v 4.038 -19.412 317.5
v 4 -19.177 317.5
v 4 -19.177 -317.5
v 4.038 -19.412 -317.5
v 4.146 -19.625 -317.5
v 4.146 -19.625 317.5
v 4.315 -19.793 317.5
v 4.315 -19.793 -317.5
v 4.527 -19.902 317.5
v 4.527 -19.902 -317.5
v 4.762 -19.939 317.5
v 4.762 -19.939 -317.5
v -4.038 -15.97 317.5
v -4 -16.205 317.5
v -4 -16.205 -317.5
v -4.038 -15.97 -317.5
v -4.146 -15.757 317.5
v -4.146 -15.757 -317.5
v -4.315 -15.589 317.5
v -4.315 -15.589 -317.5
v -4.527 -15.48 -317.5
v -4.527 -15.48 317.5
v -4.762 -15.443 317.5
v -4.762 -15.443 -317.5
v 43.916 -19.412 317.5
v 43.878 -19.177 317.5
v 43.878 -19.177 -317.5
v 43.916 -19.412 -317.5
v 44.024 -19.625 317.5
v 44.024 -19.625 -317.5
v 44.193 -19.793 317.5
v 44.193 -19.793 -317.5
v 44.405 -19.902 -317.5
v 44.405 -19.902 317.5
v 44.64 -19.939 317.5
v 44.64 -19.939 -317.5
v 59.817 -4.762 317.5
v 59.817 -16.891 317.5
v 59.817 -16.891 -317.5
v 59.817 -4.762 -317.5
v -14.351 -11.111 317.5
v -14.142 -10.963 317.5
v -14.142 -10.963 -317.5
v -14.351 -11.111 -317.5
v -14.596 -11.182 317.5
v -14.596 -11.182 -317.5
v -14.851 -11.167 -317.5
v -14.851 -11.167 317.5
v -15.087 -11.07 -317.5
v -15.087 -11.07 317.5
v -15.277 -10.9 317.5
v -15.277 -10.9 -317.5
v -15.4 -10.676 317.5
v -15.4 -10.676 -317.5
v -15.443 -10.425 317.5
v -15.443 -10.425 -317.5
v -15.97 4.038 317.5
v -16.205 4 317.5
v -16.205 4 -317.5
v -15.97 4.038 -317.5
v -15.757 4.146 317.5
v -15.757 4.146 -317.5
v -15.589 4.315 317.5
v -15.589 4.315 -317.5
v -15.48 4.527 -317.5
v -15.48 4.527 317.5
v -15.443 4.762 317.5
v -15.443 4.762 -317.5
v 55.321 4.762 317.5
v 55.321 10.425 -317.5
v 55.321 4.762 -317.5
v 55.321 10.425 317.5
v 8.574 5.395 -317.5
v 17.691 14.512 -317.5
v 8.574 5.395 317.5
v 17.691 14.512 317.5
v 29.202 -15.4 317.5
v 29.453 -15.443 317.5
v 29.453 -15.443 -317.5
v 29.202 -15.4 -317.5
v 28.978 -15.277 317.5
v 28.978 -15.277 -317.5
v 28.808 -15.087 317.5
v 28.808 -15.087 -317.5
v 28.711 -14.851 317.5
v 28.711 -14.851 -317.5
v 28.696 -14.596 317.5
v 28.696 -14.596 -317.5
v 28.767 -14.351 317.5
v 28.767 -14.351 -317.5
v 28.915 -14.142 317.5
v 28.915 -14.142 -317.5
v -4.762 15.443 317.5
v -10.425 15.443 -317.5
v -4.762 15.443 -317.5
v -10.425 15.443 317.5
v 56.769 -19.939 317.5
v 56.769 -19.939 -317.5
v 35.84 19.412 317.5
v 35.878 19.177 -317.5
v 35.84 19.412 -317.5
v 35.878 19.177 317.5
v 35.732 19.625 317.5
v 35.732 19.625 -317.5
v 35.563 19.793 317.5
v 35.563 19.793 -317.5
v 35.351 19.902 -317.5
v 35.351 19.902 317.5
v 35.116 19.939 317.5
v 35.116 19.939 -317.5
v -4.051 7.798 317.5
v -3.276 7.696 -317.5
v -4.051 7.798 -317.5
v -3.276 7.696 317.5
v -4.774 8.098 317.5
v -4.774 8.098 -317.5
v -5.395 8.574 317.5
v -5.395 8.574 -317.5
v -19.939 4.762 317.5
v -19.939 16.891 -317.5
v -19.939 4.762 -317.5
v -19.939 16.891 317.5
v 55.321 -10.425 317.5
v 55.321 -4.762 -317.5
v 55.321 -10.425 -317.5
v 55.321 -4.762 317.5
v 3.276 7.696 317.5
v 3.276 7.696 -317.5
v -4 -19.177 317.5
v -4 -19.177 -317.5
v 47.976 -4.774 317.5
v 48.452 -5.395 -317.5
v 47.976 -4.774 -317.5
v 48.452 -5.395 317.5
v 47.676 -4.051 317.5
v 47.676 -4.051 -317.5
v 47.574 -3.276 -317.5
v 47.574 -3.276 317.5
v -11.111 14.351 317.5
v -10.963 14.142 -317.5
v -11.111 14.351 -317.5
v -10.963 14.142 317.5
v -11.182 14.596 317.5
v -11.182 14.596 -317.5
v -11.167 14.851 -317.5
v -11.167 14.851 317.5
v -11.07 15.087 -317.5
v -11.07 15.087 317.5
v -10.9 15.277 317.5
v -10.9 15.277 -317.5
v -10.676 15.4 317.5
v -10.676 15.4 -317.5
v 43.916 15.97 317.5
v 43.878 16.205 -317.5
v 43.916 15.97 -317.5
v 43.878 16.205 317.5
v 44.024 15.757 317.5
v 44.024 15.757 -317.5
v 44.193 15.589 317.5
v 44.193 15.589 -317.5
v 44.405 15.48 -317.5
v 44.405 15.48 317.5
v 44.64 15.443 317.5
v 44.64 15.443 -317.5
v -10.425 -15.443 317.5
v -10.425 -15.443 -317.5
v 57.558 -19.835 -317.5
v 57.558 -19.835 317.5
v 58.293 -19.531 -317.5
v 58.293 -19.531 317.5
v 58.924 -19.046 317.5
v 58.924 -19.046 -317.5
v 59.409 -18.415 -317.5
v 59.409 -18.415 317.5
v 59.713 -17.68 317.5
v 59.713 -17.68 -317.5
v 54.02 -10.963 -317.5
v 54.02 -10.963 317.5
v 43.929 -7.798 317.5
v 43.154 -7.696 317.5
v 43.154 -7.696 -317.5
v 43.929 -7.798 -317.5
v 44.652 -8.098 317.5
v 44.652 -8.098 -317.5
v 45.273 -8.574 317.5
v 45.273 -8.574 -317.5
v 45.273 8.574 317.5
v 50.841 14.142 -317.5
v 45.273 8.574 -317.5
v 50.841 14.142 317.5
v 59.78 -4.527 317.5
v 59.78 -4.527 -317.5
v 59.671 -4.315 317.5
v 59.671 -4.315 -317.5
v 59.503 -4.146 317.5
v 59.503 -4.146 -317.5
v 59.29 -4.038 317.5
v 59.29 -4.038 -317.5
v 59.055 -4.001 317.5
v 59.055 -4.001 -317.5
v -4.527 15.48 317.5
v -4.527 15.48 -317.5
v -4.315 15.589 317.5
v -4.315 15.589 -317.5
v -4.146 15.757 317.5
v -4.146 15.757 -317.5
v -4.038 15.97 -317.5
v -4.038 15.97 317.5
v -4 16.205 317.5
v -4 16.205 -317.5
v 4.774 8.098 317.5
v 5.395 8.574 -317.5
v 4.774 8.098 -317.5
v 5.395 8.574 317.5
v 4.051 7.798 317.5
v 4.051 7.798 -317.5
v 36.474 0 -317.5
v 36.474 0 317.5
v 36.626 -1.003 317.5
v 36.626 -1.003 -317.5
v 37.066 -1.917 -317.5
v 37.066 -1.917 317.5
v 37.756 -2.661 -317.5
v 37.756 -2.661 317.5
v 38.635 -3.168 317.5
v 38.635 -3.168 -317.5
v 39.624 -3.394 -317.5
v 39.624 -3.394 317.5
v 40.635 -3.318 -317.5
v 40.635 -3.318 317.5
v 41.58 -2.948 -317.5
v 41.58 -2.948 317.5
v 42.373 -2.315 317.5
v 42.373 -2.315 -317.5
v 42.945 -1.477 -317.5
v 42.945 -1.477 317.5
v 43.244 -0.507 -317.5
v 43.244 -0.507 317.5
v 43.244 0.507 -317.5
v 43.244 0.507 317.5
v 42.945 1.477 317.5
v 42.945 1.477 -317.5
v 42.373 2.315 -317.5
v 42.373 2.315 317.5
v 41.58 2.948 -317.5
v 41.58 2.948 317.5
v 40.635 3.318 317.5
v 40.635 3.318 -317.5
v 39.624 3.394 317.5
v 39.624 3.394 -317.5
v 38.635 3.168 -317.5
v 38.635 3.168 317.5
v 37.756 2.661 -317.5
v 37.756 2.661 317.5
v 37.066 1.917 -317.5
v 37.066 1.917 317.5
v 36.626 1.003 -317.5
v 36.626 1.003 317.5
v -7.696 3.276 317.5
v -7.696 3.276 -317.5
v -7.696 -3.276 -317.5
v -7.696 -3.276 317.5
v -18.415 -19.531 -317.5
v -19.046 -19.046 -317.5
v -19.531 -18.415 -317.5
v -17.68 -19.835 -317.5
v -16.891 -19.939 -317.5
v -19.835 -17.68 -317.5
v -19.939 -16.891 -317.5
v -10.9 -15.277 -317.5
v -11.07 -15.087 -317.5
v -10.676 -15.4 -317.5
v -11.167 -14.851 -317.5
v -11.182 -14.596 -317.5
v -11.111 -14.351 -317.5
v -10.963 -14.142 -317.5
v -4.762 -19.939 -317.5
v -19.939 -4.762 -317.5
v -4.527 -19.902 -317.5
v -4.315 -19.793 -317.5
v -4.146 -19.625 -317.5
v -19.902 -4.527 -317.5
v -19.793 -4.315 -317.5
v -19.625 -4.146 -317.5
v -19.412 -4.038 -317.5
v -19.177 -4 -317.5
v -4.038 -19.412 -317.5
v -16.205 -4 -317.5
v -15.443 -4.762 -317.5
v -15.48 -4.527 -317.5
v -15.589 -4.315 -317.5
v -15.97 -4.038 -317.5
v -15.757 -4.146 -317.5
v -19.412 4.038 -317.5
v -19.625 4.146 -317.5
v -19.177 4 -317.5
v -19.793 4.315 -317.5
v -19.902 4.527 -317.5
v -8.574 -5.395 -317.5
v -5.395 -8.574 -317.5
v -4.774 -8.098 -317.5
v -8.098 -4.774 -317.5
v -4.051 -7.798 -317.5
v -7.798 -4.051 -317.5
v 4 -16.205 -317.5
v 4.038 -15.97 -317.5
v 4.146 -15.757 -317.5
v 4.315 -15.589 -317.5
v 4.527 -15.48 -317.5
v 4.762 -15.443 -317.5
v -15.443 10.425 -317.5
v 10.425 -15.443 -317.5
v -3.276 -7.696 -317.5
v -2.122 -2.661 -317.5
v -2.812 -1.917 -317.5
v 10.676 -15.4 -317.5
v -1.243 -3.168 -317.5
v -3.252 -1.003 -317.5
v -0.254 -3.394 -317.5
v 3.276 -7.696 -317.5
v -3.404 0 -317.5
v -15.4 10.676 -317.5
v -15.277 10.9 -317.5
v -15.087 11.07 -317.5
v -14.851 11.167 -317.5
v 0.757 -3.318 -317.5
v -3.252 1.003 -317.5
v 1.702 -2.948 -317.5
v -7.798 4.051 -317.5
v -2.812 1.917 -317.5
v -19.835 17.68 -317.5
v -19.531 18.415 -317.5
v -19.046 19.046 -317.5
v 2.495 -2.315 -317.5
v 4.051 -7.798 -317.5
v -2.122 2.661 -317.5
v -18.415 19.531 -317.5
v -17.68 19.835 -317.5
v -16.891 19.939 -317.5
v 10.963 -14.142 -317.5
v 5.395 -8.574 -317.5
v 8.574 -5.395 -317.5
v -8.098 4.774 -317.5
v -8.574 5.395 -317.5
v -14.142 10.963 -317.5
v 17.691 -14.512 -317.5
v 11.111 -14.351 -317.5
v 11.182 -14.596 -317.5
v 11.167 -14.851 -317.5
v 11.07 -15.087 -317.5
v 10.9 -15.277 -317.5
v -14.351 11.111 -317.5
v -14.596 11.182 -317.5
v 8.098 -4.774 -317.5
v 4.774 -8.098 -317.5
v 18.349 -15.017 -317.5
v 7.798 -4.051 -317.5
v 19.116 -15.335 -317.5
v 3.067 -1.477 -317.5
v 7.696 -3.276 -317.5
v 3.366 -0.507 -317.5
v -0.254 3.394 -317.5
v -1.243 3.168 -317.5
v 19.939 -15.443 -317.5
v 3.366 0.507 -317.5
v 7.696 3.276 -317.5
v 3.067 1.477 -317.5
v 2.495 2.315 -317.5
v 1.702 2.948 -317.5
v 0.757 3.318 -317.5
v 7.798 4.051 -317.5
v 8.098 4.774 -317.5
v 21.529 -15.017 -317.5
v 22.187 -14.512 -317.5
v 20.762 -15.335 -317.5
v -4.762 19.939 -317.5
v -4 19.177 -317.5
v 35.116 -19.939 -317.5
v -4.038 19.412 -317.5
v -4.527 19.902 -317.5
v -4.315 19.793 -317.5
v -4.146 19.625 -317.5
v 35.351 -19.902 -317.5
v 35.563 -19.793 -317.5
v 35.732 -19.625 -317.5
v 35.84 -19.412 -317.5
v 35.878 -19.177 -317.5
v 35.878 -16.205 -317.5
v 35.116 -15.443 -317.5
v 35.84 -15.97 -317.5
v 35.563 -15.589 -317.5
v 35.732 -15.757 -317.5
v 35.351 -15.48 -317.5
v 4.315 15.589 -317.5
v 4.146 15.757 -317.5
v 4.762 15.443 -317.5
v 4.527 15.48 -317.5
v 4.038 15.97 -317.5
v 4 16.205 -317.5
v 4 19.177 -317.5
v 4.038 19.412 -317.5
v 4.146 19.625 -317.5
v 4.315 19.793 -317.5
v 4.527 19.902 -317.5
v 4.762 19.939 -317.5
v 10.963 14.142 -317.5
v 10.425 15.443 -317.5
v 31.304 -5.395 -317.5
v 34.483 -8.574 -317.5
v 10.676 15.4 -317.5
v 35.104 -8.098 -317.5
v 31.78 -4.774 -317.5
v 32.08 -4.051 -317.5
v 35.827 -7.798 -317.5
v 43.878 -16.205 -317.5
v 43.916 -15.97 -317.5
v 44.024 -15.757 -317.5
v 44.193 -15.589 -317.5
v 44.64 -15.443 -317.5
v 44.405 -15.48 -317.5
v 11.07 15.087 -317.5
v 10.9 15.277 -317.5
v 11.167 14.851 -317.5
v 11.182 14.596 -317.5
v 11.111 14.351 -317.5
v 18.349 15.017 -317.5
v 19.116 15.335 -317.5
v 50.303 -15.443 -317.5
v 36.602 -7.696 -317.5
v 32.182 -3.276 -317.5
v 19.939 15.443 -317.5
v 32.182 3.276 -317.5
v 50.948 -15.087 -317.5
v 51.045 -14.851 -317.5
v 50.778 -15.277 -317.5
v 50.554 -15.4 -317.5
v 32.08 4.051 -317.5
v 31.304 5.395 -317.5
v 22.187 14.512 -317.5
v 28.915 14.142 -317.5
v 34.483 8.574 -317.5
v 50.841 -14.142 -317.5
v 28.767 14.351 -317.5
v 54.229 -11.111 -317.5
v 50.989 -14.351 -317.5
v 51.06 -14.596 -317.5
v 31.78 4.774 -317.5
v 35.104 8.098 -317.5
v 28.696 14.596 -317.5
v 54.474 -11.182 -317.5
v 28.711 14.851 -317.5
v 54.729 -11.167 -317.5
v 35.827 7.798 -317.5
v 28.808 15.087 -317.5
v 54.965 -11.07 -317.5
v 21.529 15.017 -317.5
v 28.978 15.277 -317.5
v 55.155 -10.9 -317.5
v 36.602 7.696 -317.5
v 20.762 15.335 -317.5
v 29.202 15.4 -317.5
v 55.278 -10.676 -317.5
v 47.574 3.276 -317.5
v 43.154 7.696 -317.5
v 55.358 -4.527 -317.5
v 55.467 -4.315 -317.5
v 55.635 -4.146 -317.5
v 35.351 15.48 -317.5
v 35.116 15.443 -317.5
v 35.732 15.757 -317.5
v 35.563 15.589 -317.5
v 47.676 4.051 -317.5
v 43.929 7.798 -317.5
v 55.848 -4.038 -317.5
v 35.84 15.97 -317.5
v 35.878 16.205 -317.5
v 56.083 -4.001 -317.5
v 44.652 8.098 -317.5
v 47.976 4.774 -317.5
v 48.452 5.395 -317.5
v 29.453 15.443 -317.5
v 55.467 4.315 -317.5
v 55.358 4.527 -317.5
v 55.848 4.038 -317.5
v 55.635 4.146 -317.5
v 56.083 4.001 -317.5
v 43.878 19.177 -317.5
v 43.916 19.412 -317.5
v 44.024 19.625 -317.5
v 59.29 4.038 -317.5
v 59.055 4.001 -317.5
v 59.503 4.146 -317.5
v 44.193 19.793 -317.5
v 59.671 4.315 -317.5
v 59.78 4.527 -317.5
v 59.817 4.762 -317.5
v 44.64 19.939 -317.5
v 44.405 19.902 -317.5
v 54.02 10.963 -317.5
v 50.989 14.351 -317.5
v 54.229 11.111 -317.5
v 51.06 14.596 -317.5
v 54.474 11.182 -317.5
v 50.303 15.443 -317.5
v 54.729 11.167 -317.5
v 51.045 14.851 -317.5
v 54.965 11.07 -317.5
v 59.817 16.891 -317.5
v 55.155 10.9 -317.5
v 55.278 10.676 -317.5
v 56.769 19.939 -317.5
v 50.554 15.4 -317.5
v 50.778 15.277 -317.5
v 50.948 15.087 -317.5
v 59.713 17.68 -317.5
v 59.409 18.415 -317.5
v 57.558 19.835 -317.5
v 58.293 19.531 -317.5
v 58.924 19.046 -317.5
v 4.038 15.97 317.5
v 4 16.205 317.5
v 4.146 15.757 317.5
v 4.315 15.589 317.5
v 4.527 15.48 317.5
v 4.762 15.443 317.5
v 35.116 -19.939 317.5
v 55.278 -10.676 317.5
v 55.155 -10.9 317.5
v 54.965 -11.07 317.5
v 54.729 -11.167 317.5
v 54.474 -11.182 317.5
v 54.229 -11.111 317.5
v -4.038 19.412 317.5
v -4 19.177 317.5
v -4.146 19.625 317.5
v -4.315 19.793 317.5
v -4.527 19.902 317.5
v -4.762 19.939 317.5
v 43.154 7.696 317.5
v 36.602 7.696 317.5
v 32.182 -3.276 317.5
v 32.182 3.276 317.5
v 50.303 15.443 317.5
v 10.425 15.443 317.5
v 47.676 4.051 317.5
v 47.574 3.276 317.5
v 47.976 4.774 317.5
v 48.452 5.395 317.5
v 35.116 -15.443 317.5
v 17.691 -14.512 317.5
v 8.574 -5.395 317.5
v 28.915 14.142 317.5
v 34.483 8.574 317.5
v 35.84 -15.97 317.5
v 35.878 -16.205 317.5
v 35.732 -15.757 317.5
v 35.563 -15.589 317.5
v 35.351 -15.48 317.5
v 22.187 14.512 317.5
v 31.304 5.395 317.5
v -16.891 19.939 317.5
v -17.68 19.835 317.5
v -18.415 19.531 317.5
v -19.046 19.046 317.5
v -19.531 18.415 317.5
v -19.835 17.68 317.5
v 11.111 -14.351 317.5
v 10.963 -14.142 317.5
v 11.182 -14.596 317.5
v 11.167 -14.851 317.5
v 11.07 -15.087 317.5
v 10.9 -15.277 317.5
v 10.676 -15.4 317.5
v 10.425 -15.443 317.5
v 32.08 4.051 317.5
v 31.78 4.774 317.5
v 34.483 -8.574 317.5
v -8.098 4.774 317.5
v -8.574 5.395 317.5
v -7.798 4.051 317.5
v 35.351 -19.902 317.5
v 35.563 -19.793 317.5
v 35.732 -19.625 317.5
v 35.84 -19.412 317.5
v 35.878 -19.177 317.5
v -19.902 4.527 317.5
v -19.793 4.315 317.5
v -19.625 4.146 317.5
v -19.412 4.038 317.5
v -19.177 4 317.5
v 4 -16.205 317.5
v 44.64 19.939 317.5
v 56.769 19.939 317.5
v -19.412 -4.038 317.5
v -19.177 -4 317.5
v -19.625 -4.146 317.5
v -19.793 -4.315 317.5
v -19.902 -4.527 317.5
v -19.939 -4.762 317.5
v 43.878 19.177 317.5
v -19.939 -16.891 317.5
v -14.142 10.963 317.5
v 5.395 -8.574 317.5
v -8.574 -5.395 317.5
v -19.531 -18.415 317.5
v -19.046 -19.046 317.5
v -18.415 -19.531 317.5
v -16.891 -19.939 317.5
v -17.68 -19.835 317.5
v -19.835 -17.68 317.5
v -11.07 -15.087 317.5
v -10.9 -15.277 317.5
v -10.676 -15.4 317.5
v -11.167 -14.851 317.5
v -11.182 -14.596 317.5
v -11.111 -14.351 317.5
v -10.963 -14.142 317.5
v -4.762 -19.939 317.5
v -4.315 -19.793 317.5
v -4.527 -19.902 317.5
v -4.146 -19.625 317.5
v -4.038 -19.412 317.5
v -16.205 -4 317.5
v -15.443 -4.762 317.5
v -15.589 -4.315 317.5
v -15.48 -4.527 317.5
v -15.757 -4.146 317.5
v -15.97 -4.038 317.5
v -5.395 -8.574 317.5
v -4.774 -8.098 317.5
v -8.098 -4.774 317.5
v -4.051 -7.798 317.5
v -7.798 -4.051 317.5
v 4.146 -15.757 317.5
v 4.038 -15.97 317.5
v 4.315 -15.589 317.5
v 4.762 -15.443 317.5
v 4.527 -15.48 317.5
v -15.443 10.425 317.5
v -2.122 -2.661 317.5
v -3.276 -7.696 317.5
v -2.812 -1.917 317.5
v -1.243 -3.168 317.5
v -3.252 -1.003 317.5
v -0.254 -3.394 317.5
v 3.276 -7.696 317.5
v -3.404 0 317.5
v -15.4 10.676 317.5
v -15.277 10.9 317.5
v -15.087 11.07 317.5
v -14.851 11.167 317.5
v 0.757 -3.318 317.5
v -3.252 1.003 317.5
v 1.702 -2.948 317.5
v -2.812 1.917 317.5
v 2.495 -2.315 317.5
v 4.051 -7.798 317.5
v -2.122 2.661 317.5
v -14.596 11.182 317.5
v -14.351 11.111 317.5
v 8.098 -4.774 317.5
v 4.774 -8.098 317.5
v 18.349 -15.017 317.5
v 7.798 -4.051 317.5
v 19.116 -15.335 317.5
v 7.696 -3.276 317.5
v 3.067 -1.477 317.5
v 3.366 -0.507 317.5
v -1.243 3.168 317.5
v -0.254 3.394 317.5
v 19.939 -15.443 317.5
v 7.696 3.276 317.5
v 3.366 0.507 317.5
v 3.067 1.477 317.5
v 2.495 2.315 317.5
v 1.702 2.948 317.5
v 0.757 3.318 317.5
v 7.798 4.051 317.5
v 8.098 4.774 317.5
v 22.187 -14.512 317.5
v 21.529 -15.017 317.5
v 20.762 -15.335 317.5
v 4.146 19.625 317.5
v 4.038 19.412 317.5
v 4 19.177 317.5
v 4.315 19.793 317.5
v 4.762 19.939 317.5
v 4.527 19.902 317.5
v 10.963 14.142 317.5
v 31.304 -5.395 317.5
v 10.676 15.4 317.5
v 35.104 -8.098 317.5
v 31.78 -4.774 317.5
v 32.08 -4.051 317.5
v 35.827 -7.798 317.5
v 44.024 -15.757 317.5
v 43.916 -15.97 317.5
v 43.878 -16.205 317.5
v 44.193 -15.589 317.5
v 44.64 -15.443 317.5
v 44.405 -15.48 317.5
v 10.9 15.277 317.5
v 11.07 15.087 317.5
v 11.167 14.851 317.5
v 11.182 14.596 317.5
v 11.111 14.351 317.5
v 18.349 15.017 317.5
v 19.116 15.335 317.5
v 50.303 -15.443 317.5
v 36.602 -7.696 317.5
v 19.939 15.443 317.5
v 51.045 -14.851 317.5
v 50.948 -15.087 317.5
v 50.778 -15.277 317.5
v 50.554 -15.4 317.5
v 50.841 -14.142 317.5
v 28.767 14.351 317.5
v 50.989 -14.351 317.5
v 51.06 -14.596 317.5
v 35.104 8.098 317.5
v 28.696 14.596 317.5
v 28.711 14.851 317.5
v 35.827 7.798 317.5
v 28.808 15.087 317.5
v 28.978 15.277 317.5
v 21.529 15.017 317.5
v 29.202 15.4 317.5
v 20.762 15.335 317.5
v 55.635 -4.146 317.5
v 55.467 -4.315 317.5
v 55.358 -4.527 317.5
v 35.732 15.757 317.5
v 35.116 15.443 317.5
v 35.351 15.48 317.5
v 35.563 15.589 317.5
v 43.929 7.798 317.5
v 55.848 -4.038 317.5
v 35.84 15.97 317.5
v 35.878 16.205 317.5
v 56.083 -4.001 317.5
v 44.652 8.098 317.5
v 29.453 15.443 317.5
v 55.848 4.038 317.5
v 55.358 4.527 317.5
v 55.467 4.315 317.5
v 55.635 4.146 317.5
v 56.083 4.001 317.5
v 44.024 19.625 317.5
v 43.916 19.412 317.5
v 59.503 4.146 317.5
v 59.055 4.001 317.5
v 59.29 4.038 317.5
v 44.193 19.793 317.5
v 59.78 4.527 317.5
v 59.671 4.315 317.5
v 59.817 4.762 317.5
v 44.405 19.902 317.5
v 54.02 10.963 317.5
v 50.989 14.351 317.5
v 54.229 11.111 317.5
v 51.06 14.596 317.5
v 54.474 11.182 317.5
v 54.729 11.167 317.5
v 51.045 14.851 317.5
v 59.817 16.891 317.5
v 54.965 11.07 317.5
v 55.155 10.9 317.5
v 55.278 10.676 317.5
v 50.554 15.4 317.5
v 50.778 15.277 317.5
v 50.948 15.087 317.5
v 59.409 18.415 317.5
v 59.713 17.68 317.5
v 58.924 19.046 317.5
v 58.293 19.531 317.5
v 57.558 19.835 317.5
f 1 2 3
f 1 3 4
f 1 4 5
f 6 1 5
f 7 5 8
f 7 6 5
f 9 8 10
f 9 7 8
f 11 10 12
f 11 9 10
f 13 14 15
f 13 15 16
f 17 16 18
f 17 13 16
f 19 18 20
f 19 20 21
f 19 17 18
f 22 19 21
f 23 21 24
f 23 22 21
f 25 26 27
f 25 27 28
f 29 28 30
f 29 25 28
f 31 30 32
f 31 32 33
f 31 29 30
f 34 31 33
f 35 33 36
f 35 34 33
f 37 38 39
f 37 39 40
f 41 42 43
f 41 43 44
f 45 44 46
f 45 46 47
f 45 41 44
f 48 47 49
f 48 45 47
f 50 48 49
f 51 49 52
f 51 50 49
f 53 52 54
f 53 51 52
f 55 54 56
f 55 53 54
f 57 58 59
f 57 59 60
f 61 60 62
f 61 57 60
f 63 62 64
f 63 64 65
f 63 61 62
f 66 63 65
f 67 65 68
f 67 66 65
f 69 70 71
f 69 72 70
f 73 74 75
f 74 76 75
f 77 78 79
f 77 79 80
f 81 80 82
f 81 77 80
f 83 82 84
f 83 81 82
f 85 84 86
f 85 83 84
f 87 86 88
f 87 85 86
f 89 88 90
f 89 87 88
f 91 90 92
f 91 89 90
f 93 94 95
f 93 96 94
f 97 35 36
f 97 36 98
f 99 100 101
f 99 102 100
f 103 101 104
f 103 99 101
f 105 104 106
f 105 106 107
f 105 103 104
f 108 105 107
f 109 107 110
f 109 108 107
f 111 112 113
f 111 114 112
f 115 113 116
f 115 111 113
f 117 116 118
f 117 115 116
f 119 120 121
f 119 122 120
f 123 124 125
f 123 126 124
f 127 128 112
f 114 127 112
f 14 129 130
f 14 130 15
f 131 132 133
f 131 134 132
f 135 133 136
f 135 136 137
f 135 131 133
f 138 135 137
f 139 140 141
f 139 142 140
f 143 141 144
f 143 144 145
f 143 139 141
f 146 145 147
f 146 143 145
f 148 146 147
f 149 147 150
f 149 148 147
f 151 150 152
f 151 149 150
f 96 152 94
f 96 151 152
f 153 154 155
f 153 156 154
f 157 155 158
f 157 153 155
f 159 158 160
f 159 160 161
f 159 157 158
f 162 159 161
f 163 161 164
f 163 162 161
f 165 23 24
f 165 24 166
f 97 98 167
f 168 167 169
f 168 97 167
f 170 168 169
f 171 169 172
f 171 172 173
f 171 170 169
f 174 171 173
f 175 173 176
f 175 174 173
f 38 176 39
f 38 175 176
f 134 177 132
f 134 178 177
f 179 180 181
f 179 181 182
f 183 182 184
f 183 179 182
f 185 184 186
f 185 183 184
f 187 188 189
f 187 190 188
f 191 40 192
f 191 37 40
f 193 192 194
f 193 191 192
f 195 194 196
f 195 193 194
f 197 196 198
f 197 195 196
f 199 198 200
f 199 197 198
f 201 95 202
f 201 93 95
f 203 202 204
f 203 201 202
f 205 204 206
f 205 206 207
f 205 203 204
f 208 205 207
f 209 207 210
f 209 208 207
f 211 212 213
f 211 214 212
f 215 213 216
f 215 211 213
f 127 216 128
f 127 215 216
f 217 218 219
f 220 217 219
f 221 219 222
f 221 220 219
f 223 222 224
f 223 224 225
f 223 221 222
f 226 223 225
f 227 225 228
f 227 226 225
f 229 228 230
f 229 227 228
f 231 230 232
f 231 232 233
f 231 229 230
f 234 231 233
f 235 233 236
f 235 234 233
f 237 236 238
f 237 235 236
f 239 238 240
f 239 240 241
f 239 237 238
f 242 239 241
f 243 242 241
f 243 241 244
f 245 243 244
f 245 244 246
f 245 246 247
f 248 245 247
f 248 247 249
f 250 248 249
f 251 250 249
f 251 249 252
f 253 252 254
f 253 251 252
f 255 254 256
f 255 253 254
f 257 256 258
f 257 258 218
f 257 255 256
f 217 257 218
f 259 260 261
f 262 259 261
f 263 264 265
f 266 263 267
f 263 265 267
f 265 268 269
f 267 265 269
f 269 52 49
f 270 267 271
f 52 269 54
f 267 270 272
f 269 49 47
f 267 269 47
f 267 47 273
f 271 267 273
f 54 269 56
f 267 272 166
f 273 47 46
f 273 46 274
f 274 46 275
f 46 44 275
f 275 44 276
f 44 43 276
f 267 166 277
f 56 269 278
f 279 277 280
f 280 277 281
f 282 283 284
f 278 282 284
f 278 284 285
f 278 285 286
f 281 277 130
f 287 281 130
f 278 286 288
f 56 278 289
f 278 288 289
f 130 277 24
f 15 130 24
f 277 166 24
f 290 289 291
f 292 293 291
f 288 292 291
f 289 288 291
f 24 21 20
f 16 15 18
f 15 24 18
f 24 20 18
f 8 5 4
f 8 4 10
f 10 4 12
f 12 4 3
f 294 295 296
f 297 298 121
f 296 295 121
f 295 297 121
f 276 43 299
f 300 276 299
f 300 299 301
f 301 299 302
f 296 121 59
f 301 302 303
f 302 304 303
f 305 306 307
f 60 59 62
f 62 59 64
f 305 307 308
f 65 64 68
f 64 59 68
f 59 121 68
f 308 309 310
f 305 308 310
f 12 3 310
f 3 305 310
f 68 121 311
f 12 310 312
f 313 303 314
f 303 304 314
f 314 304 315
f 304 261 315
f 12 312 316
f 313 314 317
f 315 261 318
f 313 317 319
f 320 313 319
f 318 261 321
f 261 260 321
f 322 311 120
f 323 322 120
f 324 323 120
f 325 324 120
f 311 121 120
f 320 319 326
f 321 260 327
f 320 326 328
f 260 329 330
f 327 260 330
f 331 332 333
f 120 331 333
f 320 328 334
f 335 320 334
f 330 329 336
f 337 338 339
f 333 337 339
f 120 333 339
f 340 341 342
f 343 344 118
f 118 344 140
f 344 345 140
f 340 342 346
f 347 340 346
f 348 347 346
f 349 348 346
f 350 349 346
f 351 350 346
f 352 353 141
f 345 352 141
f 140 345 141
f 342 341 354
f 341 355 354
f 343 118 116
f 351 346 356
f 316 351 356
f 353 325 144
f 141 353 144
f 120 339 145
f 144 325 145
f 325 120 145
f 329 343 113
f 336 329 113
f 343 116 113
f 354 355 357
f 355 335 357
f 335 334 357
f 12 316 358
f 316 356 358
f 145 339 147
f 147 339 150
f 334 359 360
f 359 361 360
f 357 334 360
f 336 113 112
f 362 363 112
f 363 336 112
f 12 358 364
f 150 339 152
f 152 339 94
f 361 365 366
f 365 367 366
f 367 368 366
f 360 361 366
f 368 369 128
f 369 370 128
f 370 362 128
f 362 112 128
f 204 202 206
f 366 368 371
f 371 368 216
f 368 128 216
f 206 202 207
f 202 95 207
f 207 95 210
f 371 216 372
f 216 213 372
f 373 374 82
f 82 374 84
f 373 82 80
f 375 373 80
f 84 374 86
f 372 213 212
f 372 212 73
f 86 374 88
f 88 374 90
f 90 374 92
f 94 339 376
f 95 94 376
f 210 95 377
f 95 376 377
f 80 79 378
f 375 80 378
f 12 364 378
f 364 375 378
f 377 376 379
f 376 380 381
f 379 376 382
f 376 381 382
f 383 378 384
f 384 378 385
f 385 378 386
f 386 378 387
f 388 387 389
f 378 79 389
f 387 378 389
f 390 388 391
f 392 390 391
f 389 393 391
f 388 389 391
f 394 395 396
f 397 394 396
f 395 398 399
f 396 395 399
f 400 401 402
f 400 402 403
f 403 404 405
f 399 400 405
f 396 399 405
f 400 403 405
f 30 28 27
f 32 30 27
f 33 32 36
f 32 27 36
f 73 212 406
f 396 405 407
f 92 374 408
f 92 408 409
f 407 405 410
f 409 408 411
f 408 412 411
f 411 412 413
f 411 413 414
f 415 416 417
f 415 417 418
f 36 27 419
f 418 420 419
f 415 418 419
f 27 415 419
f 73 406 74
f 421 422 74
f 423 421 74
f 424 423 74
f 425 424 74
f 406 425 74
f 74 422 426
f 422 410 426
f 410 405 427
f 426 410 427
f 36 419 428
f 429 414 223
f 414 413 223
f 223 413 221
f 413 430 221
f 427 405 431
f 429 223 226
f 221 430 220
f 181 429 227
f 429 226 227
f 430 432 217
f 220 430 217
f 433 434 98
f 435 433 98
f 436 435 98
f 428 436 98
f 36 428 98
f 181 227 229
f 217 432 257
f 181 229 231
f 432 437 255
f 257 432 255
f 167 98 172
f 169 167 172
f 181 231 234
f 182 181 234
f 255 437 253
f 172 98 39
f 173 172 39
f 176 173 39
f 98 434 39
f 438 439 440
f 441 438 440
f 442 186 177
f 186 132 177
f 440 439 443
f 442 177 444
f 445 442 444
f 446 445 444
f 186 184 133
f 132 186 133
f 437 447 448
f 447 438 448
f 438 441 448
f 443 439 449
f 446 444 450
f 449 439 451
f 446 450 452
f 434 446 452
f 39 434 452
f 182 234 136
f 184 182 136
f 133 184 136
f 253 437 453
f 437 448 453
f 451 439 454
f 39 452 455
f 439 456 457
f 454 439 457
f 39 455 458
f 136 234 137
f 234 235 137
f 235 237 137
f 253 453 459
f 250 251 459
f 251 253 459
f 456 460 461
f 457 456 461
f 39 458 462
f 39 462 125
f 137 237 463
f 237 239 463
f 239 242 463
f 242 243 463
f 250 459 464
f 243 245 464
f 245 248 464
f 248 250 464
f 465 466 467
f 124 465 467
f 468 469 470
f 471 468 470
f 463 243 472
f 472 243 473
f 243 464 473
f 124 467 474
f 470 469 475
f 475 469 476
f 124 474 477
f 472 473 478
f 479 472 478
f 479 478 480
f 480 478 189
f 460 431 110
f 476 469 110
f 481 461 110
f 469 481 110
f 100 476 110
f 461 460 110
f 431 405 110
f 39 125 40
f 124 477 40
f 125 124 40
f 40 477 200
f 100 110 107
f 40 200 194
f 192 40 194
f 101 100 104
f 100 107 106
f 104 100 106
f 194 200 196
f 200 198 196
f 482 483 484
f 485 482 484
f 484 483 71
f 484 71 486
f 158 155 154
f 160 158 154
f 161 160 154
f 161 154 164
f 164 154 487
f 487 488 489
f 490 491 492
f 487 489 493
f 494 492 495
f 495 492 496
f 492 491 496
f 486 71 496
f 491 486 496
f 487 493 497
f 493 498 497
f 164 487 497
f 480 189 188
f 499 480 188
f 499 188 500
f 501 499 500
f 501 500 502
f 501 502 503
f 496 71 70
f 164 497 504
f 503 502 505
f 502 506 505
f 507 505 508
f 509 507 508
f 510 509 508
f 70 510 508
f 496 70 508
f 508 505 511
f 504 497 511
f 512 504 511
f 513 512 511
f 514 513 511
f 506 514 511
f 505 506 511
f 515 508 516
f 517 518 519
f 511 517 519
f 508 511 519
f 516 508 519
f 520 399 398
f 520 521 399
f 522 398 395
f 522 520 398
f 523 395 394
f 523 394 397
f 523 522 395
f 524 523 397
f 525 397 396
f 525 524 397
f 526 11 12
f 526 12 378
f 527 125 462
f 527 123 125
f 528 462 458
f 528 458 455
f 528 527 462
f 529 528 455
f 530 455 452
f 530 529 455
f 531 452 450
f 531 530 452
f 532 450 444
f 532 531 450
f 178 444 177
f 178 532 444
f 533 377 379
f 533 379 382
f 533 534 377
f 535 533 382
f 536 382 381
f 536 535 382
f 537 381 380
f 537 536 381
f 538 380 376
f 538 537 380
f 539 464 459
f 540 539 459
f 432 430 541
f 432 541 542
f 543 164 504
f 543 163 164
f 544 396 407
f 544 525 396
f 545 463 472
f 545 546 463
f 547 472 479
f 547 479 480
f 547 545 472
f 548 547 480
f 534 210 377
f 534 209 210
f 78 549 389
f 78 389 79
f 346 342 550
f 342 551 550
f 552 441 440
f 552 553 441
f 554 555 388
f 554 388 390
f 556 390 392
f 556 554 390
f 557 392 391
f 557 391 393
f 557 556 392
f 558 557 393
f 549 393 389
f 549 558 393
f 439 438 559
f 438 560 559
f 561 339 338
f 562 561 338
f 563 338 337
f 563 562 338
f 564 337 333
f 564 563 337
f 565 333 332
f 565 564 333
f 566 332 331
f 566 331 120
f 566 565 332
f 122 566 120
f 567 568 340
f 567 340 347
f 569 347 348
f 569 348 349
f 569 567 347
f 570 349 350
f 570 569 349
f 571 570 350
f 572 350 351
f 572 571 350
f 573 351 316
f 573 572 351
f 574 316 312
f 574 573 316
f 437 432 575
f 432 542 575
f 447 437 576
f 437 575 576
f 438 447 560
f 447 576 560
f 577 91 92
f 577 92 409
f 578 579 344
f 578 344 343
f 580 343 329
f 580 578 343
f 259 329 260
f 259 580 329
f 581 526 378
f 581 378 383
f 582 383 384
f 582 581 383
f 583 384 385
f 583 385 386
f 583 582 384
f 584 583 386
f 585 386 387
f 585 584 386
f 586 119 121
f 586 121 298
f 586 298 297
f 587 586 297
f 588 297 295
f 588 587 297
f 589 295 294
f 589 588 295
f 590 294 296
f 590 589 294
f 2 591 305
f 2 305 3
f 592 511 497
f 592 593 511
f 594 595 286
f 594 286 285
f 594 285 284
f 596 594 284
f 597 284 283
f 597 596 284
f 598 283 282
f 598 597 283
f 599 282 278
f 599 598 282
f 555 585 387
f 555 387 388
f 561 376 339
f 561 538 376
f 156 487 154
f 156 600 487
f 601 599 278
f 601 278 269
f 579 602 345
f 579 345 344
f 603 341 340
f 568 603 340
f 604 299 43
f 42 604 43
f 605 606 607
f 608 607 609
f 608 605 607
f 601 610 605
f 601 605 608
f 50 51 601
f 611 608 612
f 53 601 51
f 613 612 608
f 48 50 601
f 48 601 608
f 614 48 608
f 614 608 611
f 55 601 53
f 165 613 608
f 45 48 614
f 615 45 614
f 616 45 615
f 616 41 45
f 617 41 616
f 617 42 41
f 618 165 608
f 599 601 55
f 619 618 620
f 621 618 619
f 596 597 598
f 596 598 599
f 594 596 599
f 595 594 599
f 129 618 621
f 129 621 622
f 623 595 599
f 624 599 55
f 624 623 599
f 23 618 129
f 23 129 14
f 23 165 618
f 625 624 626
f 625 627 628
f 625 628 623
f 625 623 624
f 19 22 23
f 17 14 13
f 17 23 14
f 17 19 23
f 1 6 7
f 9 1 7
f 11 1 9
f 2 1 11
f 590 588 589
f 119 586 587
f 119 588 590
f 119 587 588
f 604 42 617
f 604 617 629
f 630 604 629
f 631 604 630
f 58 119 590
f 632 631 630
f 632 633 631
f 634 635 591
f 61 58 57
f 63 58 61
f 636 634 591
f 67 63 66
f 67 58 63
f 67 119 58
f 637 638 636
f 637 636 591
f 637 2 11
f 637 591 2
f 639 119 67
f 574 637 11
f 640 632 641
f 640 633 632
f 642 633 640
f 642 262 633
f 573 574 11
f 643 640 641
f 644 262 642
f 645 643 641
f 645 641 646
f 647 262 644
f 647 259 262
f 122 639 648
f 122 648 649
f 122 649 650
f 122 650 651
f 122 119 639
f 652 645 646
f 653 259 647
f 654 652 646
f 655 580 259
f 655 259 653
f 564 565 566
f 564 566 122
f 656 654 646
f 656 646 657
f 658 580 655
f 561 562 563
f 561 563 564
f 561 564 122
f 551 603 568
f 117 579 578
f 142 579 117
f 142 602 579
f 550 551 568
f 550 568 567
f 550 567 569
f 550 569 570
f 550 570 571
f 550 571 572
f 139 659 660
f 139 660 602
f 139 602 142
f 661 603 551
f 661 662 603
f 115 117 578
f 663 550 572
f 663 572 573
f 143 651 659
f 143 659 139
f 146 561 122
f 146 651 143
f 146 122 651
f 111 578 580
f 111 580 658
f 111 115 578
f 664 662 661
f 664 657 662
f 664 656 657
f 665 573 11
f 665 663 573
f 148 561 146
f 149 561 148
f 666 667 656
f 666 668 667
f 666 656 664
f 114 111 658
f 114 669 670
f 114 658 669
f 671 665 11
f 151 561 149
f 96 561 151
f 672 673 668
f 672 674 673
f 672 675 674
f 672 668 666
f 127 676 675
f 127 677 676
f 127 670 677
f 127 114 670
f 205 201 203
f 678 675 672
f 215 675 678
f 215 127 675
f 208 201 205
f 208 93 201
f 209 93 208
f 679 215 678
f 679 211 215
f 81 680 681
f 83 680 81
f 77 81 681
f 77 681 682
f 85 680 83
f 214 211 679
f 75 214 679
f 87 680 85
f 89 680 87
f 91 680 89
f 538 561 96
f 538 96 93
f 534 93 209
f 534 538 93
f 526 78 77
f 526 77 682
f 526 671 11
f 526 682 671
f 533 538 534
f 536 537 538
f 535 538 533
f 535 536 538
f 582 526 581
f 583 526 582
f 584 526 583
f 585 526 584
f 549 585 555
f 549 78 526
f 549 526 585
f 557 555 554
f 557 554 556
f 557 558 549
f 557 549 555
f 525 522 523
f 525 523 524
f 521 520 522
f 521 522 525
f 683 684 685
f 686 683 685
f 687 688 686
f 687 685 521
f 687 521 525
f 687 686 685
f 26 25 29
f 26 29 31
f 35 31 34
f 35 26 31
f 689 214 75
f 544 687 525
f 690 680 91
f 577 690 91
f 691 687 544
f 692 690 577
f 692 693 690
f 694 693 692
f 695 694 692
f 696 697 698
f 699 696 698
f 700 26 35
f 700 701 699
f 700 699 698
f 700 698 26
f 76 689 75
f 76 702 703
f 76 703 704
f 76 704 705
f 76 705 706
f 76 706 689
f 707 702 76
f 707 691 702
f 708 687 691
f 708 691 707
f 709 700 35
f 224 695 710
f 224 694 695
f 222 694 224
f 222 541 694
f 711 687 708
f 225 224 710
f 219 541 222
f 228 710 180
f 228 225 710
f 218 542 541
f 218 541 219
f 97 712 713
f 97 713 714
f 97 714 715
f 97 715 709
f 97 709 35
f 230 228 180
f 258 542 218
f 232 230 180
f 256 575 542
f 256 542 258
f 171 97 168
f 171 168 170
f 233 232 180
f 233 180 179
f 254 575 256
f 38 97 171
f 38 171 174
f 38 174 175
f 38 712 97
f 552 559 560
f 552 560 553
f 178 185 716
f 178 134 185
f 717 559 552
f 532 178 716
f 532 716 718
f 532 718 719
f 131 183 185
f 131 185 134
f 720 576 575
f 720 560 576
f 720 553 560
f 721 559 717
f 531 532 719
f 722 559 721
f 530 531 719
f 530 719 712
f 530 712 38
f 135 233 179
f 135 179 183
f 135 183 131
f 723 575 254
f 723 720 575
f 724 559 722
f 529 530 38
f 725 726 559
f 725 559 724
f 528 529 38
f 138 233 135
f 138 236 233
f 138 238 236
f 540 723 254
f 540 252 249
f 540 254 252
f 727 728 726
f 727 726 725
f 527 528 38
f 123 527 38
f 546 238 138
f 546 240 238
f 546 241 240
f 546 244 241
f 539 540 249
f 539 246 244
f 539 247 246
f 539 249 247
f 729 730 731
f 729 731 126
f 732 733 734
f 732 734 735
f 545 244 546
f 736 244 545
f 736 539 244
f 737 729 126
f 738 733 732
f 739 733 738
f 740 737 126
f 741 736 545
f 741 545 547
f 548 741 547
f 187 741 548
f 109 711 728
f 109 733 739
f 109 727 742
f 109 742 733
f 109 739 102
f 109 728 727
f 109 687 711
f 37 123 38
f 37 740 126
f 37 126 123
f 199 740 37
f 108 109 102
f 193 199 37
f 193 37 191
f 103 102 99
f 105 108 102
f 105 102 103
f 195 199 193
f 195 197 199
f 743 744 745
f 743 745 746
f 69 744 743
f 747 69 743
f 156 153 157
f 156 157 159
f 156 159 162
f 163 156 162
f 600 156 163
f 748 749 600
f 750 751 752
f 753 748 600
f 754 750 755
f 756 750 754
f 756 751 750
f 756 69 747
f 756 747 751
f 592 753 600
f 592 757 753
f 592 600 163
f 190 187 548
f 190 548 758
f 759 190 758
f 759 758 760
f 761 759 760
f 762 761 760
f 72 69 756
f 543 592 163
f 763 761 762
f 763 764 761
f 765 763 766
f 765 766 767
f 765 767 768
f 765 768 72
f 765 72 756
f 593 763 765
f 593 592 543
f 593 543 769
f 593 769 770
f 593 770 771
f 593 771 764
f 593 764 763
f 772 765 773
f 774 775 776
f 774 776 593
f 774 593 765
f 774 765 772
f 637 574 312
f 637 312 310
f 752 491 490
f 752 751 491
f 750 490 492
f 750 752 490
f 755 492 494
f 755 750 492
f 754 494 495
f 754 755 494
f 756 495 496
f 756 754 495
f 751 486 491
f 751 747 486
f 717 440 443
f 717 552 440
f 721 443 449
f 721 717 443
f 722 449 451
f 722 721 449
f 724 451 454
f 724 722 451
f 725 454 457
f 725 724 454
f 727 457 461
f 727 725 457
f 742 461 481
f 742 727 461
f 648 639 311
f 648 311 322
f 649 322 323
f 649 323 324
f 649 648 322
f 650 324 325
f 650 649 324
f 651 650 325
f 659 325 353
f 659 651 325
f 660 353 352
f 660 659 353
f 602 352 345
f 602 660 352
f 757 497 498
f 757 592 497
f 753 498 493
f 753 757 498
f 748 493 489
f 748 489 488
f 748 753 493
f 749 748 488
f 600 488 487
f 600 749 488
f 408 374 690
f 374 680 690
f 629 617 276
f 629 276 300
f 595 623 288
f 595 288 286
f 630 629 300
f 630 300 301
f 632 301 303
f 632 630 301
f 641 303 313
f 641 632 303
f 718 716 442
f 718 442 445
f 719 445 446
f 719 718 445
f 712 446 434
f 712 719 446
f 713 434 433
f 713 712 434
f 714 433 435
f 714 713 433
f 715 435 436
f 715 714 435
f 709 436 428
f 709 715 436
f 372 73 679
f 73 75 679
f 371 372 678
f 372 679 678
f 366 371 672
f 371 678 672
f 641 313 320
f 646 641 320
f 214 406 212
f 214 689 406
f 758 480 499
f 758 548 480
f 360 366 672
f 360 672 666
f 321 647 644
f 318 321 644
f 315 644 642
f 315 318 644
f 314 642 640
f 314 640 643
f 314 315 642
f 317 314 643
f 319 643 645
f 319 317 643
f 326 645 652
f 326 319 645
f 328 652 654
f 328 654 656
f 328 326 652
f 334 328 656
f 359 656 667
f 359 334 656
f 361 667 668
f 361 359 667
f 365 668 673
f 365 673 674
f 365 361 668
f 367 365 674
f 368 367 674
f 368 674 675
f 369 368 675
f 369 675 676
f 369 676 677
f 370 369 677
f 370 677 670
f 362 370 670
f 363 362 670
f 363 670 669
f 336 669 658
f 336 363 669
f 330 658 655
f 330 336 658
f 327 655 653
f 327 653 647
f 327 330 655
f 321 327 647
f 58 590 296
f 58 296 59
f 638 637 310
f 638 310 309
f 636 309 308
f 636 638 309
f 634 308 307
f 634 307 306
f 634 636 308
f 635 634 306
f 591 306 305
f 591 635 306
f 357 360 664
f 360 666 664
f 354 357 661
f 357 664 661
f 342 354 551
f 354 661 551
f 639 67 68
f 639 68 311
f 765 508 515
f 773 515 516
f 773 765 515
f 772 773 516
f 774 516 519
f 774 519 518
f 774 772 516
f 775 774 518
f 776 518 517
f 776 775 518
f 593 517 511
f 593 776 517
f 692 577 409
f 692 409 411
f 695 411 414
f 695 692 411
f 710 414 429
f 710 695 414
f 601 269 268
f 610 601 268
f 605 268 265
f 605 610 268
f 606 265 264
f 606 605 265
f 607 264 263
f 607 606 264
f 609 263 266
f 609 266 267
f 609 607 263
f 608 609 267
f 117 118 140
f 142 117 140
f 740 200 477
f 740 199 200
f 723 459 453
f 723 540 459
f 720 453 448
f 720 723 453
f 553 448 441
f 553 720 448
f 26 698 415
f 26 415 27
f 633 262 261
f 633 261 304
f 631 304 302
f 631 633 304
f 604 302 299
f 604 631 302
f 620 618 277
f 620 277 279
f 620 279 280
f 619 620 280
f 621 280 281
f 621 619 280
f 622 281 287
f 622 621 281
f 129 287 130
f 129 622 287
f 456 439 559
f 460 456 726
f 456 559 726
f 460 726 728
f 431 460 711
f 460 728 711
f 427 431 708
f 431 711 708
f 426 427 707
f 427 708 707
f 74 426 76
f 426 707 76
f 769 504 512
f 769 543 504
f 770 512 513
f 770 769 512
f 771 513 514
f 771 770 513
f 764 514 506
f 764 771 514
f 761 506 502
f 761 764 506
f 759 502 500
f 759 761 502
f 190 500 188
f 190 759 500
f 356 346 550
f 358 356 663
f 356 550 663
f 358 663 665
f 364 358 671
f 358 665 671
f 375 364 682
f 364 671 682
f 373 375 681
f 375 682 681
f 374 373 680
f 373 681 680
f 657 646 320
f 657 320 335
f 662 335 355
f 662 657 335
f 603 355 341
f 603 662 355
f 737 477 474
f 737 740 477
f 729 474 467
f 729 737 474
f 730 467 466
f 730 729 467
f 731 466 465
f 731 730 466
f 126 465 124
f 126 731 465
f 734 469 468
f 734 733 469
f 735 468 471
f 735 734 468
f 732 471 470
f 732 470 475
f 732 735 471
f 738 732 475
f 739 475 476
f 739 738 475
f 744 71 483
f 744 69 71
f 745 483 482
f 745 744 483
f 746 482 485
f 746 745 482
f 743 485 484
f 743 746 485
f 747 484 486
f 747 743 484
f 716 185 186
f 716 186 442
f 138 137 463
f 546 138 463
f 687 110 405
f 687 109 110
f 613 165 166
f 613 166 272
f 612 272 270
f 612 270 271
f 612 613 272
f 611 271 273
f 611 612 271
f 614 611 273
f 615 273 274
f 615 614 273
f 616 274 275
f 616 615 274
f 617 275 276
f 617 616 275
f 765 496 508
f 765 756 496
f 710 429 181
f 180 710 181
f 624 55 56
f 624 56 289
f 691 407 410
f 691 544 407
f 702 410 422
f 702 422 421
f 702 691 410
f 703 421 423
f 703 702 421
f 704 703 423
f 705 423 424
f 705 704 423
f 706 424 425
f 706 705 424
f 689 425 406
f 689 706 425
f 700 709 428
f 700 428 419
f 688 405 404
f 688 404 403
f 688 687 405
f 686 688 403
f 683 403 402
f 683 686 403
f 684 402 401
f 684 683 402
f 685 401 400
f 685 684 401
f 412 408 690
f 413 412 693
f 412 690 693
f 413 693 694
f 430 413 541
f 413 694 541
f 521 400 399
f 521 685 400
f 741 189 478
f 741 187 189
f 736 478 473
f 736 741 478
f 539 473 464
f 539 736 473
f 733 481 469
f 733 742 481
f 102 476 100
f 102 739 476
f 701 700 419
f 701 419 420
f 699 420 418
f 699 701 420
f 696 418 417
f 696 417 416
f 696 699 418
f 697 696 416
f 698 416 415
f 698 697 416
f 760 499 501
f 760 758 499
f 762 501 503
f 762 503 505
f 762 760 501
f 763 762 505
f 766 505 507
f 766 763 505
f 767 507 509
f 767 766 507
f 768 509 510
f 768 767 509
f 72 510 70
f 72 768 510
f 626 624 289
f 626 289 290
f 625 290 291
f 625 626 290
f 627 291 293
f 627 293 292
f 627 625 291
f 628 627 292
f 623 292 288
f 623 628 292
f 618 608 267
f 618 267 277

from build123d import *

# Parameters (mm, degrees)
SKETCH1_R      = 3.4036
EXTRUDE1_DEPTH = 317.5


with BuildPart() as part:
    # Sketch1 → Extrude1 (new, symmetric)
    with BuildSketch(Plane.XY):
        with BuildLine():
            Line((-19.939, 16.891), (-19.939, 4.7625))
            ThreePointArc((-19.939, 4.7625), (-19.715815367, 4.223684633), (-19.177, 4.0005))
            Line((-19.177, 4.0005), (-16.2052, 4.0005))
            ThreePointArc((-16.2052, 4.0005), (-15.666384633, 4.223684633), (-15.4432, 4.7625))
            Line((-15.4432, 4.7625), (-15.4432, 10.424558599))
            ThreePointArc((-15.4432, 10.424558599), (-14.972804775, 11.128554802), (-14.142384633, 10.963373966))
            Line((-14.142384633, 10.963373966), (-8.574059555, 5.395048889))
            ThreePointArc((-8.574059555, 5.395048889), (-7.924348265, 4.422687227), (-7.6962, 3.275708444))
            Line((-7.6962, 3.275708444), (-7.6962, -3.275708444))
            ThreePointArc((-7.6962, -3.275708444), (-7.924348265, -4.422687227), (-8.574059555, -5.395048889))
            Line((-8.574059555, -5.395048889), (-14.142384633, -10.963373966))
            ThreePointArc((-14.142384633, -10.963373966), (-14.972804775, -11.128554802), (-15.4432, -10.424558599))
            Line((-15.4432, -10.424558599), (-15.4432, -4.7625))
            ThreePointArc((-15.4432, -4.7625), (-15.666384633, -4.223684633), (-16.2052, -4.0005))
            Line((-16.2052, -4.0005), (-19.177, -4.0005))
            ThreePointArc((-19.177, -4.0005), (-19.715815367, -4.223684633), (-19.939, -4.7625))
            Line((-19.939, -4.7625), (-19.939, -16.891))
            ThreePointArc((-19.939, -16.891), (-19.046261469, -19.046261469), (-16.891, -19.939))
            Line((-16.891, -19.939), (-4.7625, -19.939))
            ThreePointArc((-4.7625, -19.939), (-4.223684633, -19.715815367), (-4.0005, -19.177))
            Line((-4.0005, -19.177), (-4.0005, -16.2052))
            ThreePointArc((-4.0005, -16.2052), (-4.223684633, -15.666384633), (-4.7625, -15.4432))
            Line((-4.7625, -15.4432), (-10.424558599, -15.4432))
            ThreePointArc((-10.424558599, -15.4432), (-11.128554802, -14.972804775), (-10.963373966, -14.142384633))
            Line((-10.963373966, -14.142384633), (-5.395048889, -8.574059555))
            ThreePointArc((-5.395048889, -8.574059555), (-4.422687227, -7.924348265), (-3.275708444, -7.6962))
            Line((-3.275708444, -7.6962), (3.275708444, -7.6962))
            ThreePointArc((3.275708444, -7.6962), (4.422687227, -7.924348265), (5.395048889, -8.574059555))
            Line((5.395048889, -8.574059555), (10.963373966, -14.142384633))
            ThreePointArc((10.963373966, -14.142384633), (11.128554802, -14.972804775), (10.424558599, -15.4432))
            Line((10.424558599, -15.4432), (4.7625, -15.4432))
            ThreePointArc((4.7625, -15.4432), (4.223684633, -15.666384633), (4.0005, -16.2052))
            Line((4.0005, -16.2052), (4.0005, -19.177))
            ThreePointArc((4.0005, -19.177), (4.223684633, -19.715815367), (4.7625, -19.939))
            Line((4.7625, -19.939), (19.939, -19.939))
            Line((19.939, -19.939), (35.1155, -19.939))
            ThreePointArc((35.1155, -19.939), (35.654315367, -19.715815367), (35.8775, -19.177))
            Line((35.8775, -19.177), (35.8775, -16.2052))
            ThreePointArc((35.8775, -16.2052), (35.654315367, -15.666384633), (35.1155, -15.4432))
            Line((35.1155, -15.4432), (29.453441401, -15.4432))
            ThreePointArc((29.453441401, -15.4432), (28.749445198, -14.972804775), (28.914626034, -14.142384633))
            Line((28.914626034, -14.142384633), (34.482951111, -8.574059555))
            ThreePointArc((34.482951111, -8.574059555), (35.455312773, -7.924348265), (36.602291556, -7.6962))
            Line((36.602291556, -7.6962), (43.153708444, -7.6962))
            ThreePointArc((43.153708444, -7.6962), (44.300687227, -7.924348265), (45.273048889, -8.574059555))
            Line((45.273048889, -8.574059555), (50.841373966, -14.142384633))
            ThreePointArc((50.841373966, -14.142384633), (51.006554802, -14.972804775), (50.302558599, -15.4432))
            Line((50.302558599, -15.4432), (44.6405, -15.4432))
            ThreePointArc((44.6405, -15.4432), (44.101684633, -15.666384633), (43.8785, -16.2052))
            Line((43.8785, -16.2052), (43.8785, -19.177))
            ThreePointArc((43.8785, -19.177), (44.101684633, -19.715815367), (44.6405, -19.939))
            Line((44.6405, -19.939), (56.769, -19.939))
            ThreePointArc((56.769, -19.939), (58.924261469, -19.046261469), (59.817, -16.891))
            Line((59.817, -16.891), (59.817, -4.7625))
            ThreePointArc((59.817, -4.7625), (59.593815367, -4.223684633), (59.055, -4.0005))
            Line((59.055, -4.0005), (56.0832, -4.0005))
            ThreePointArc((56.0832, -4.0005), (55.544384633, -4.223684633), (55.3212, -4.7625))
            Line((55.3212, -4.7625), (55.3212, -10.424558599))
            ThreePointArc((55.3212, -10.424558599), (54.850804775, -11.128554802), (54.020384633, -10.963373966))
            Line((54.020384633, -10.963373966), (48.452059555, -5.395048889))
            ThreePointArc((48.452059555, -5.395048889), (47.802348265, -4.422687227), (47.5742, -3.275708444))
            Line((47.5742, -3.275708444), (47.5742, 3.275708444))
            ThreePointArc((47.5742, 3.275708444), (47.802348265, 4.422687227), (48.452059555, 5.395048889))
            Line((48.452059555, 5.395048889), (54.020384633, 10.963373966))
            ThreePointArc((54.020384633, 10.963373966), (54.850804775, 11.128554802), (55.3212, 10.424558599))
            Line((55.3212, 10.424558599), (55.3212, 4.7625))
            ThreePointArc((55.3212, 4.7625), (55.544384633, 4.223684633), (56.0832, 4.0005))
            Line((56.0832, 4.0005), (59.055, 4.0005))
            ThreePointArc((59.055, 4.0005), (59.593815367, 4.223684633), (59.817, 4.7625))
            Line((59.817, 4.7625), (59.817, 16.891))
            ThreePointArc((59.817, 16.891), (58.924261469, 19.046261469), (56.769, 19.939))
            Line((56.769, 19.939), (44.6405, 19.939))
            ThreePointArc((44.6405, 19.939), (44.101684633, 19.715815367), (43.8785, 19.177))
            Line((43.8785, 19.177), (43.8785, 16.2052))
            ThreePointArc((43.8785, 16.2052), (44.101684633, 15.666384633), (44.6405, 15.4432))
            Line((44.6405, 15.4432), (50.302558599, 15.4432))
            ThreePointArc((50.302558599, 15.4432), (51.006554802, 14.972804775), (50.841373966, 14.142384633))
            Line((50.841373966, 14.142384633), (45.273048889, 8.574059555))
            ThreePointArc((45.273048889, 8.574059555), (44.300687227, 7.924348265), (43.153708444, 7.6962))
            Line((43.153708444, 7.6962), (36.602291556, 7.6962))
            ThreePointArc((36.602291556, 7.6962), (35.455312773, 7.924348265), (34.482951111, 8.574059555))
            Line((34.482951111, 8.574059555), (28.914626034, 14.142384633))
            ThreePointArc((28.914626034, 14.142384633), (28.749445198, 14.972804775), (29.453441401, 15.4432))
            Line((29.453441401, 15.4432), (35.1155, 15.4432))
            ThreePointArc((35.1155, 15.4432), (35.654315367, 15.666384633), (35.8775, 16.2052))
            Line((35.8775, 16.2052), (35.8775, 19.177))
            ThreePointArc((35.8775, 19.177), (35.654315367, 19.715815367), (35.1155, 19.939))
            Line((35.1155, 19.939), (4.7625, 19.939))
            ThreePointArc((4.7625, 19.939), (4.223684633, 19.715815367), (4.0005, 19.177))
            Line((4.0005, 19.177), (4.0005, 16.2052))
            ThreePointArc((4.0005, 16.2052), (4.223684633, 15.666384633), (4.7625, 15.4432))
            Line((4.7625, 15.4432), (10.424558599, 15.4432))
            ThreePointArc((10.424558599, 15.4432), (11.128554802, 14.972804775), (10.963373966, 14.142384633))
            Line((10.963373966, 14.142384633), (5.395048889, 8.574059555))
            ThreePointArc((5.395048889, 8.574059555), (4.422687227, 7.924348265), (3.275708444, 7.6962))
            Line((3.275708444, 7.6962), (-3.275708444, 7.6962))
            ThreePointArc((-3.275708444, 7.6962), (-4.422687227, 7.924348265), (-5.395048889, 8.574059555))
            Line((-5.395048889, 8.574059555), (-10.963373966, 14.142384633))
            ThreePointArc((-10.963373966, 14.142384633), (-11.128554802, 14.972804775), (-10.424558599, 15.4432))
            Line((-10.424558599, 15.4432), (-4.7625, 15.4432))
            ThreePointArc((-4.7625, 15.4432), (-4.223684633, 15.666384633), (-4.0005, 16.2052))
            Line((-4.0005, 16.2052), (-4.0005, 19.177))
            ThreePointArc((-4.0005, 19.177), (-4.223684633, 19.715815367), (-4.7625, 19.939))
            Line((-4.7625, 19.939), (-16.891, 19.939))
            ThreePointArc((-16.891, 19.939), (-19.046261469, 19.046261469), (-19.939, 16.891))
        make_face()
        with Locations(Location((0, 0, 0), (0, 0, 180))):
            Circle(SKETCH1_R, mode=Mode.SUBTRACT)
        with Locations(Location((39.878, 0, 0), (0, 0, 180))):
            Circle(SKETCH1_R, mode=Mode.SUBTRACT)
        with BuildLine():
            Line((7.6962, 3.275708444), (7.6962, -3.275708444))
            ThreePointArc((7.6962, -3.275708444), (7.924348265, -4.422687227), (8.574059555, -5.395048889))
            Line((8.574059555, -5.395048889), (17.6911, -14.512089333))
            ThreePointArc((17.6911, -14.512089333), (19.939, -15.4432), (22.1869, -14.512089333))
            Line((22.1869, -14.512089333), (31.303940445, -5.395048889))
            ThreePointArc((31.303940445, -5.395048889), (31.953651735, -4.422687227), (32.1818, -3.275708444))
            Line((32.1818, -3.275708444), (32.1818, 3.275708444))
            ThreePointArc((32.1818, 3.275708444), (31.953651735, 4.422687227), (31.303940445, 5.395048889))
            Line((31.303940445, 5.395048889), (22.1869, 14.512089333))
            ThreePointArc((22.1869, 14.512089333), (19.939, 15.4432), (17.6911, 14.512089333))
            Line((17.6911, 14.512089333), (8.574059555, 5.395048889))
            ThreePointArc((8.574059555, 5.395048889), (7.924348265, 4.422687227), (7.6962, 3.275708444))
        make_face(mode=Mode.SUBTRACT)
    extrude(amount=EXTRUDE1_DEPTH, both=True)


solid = part.part
